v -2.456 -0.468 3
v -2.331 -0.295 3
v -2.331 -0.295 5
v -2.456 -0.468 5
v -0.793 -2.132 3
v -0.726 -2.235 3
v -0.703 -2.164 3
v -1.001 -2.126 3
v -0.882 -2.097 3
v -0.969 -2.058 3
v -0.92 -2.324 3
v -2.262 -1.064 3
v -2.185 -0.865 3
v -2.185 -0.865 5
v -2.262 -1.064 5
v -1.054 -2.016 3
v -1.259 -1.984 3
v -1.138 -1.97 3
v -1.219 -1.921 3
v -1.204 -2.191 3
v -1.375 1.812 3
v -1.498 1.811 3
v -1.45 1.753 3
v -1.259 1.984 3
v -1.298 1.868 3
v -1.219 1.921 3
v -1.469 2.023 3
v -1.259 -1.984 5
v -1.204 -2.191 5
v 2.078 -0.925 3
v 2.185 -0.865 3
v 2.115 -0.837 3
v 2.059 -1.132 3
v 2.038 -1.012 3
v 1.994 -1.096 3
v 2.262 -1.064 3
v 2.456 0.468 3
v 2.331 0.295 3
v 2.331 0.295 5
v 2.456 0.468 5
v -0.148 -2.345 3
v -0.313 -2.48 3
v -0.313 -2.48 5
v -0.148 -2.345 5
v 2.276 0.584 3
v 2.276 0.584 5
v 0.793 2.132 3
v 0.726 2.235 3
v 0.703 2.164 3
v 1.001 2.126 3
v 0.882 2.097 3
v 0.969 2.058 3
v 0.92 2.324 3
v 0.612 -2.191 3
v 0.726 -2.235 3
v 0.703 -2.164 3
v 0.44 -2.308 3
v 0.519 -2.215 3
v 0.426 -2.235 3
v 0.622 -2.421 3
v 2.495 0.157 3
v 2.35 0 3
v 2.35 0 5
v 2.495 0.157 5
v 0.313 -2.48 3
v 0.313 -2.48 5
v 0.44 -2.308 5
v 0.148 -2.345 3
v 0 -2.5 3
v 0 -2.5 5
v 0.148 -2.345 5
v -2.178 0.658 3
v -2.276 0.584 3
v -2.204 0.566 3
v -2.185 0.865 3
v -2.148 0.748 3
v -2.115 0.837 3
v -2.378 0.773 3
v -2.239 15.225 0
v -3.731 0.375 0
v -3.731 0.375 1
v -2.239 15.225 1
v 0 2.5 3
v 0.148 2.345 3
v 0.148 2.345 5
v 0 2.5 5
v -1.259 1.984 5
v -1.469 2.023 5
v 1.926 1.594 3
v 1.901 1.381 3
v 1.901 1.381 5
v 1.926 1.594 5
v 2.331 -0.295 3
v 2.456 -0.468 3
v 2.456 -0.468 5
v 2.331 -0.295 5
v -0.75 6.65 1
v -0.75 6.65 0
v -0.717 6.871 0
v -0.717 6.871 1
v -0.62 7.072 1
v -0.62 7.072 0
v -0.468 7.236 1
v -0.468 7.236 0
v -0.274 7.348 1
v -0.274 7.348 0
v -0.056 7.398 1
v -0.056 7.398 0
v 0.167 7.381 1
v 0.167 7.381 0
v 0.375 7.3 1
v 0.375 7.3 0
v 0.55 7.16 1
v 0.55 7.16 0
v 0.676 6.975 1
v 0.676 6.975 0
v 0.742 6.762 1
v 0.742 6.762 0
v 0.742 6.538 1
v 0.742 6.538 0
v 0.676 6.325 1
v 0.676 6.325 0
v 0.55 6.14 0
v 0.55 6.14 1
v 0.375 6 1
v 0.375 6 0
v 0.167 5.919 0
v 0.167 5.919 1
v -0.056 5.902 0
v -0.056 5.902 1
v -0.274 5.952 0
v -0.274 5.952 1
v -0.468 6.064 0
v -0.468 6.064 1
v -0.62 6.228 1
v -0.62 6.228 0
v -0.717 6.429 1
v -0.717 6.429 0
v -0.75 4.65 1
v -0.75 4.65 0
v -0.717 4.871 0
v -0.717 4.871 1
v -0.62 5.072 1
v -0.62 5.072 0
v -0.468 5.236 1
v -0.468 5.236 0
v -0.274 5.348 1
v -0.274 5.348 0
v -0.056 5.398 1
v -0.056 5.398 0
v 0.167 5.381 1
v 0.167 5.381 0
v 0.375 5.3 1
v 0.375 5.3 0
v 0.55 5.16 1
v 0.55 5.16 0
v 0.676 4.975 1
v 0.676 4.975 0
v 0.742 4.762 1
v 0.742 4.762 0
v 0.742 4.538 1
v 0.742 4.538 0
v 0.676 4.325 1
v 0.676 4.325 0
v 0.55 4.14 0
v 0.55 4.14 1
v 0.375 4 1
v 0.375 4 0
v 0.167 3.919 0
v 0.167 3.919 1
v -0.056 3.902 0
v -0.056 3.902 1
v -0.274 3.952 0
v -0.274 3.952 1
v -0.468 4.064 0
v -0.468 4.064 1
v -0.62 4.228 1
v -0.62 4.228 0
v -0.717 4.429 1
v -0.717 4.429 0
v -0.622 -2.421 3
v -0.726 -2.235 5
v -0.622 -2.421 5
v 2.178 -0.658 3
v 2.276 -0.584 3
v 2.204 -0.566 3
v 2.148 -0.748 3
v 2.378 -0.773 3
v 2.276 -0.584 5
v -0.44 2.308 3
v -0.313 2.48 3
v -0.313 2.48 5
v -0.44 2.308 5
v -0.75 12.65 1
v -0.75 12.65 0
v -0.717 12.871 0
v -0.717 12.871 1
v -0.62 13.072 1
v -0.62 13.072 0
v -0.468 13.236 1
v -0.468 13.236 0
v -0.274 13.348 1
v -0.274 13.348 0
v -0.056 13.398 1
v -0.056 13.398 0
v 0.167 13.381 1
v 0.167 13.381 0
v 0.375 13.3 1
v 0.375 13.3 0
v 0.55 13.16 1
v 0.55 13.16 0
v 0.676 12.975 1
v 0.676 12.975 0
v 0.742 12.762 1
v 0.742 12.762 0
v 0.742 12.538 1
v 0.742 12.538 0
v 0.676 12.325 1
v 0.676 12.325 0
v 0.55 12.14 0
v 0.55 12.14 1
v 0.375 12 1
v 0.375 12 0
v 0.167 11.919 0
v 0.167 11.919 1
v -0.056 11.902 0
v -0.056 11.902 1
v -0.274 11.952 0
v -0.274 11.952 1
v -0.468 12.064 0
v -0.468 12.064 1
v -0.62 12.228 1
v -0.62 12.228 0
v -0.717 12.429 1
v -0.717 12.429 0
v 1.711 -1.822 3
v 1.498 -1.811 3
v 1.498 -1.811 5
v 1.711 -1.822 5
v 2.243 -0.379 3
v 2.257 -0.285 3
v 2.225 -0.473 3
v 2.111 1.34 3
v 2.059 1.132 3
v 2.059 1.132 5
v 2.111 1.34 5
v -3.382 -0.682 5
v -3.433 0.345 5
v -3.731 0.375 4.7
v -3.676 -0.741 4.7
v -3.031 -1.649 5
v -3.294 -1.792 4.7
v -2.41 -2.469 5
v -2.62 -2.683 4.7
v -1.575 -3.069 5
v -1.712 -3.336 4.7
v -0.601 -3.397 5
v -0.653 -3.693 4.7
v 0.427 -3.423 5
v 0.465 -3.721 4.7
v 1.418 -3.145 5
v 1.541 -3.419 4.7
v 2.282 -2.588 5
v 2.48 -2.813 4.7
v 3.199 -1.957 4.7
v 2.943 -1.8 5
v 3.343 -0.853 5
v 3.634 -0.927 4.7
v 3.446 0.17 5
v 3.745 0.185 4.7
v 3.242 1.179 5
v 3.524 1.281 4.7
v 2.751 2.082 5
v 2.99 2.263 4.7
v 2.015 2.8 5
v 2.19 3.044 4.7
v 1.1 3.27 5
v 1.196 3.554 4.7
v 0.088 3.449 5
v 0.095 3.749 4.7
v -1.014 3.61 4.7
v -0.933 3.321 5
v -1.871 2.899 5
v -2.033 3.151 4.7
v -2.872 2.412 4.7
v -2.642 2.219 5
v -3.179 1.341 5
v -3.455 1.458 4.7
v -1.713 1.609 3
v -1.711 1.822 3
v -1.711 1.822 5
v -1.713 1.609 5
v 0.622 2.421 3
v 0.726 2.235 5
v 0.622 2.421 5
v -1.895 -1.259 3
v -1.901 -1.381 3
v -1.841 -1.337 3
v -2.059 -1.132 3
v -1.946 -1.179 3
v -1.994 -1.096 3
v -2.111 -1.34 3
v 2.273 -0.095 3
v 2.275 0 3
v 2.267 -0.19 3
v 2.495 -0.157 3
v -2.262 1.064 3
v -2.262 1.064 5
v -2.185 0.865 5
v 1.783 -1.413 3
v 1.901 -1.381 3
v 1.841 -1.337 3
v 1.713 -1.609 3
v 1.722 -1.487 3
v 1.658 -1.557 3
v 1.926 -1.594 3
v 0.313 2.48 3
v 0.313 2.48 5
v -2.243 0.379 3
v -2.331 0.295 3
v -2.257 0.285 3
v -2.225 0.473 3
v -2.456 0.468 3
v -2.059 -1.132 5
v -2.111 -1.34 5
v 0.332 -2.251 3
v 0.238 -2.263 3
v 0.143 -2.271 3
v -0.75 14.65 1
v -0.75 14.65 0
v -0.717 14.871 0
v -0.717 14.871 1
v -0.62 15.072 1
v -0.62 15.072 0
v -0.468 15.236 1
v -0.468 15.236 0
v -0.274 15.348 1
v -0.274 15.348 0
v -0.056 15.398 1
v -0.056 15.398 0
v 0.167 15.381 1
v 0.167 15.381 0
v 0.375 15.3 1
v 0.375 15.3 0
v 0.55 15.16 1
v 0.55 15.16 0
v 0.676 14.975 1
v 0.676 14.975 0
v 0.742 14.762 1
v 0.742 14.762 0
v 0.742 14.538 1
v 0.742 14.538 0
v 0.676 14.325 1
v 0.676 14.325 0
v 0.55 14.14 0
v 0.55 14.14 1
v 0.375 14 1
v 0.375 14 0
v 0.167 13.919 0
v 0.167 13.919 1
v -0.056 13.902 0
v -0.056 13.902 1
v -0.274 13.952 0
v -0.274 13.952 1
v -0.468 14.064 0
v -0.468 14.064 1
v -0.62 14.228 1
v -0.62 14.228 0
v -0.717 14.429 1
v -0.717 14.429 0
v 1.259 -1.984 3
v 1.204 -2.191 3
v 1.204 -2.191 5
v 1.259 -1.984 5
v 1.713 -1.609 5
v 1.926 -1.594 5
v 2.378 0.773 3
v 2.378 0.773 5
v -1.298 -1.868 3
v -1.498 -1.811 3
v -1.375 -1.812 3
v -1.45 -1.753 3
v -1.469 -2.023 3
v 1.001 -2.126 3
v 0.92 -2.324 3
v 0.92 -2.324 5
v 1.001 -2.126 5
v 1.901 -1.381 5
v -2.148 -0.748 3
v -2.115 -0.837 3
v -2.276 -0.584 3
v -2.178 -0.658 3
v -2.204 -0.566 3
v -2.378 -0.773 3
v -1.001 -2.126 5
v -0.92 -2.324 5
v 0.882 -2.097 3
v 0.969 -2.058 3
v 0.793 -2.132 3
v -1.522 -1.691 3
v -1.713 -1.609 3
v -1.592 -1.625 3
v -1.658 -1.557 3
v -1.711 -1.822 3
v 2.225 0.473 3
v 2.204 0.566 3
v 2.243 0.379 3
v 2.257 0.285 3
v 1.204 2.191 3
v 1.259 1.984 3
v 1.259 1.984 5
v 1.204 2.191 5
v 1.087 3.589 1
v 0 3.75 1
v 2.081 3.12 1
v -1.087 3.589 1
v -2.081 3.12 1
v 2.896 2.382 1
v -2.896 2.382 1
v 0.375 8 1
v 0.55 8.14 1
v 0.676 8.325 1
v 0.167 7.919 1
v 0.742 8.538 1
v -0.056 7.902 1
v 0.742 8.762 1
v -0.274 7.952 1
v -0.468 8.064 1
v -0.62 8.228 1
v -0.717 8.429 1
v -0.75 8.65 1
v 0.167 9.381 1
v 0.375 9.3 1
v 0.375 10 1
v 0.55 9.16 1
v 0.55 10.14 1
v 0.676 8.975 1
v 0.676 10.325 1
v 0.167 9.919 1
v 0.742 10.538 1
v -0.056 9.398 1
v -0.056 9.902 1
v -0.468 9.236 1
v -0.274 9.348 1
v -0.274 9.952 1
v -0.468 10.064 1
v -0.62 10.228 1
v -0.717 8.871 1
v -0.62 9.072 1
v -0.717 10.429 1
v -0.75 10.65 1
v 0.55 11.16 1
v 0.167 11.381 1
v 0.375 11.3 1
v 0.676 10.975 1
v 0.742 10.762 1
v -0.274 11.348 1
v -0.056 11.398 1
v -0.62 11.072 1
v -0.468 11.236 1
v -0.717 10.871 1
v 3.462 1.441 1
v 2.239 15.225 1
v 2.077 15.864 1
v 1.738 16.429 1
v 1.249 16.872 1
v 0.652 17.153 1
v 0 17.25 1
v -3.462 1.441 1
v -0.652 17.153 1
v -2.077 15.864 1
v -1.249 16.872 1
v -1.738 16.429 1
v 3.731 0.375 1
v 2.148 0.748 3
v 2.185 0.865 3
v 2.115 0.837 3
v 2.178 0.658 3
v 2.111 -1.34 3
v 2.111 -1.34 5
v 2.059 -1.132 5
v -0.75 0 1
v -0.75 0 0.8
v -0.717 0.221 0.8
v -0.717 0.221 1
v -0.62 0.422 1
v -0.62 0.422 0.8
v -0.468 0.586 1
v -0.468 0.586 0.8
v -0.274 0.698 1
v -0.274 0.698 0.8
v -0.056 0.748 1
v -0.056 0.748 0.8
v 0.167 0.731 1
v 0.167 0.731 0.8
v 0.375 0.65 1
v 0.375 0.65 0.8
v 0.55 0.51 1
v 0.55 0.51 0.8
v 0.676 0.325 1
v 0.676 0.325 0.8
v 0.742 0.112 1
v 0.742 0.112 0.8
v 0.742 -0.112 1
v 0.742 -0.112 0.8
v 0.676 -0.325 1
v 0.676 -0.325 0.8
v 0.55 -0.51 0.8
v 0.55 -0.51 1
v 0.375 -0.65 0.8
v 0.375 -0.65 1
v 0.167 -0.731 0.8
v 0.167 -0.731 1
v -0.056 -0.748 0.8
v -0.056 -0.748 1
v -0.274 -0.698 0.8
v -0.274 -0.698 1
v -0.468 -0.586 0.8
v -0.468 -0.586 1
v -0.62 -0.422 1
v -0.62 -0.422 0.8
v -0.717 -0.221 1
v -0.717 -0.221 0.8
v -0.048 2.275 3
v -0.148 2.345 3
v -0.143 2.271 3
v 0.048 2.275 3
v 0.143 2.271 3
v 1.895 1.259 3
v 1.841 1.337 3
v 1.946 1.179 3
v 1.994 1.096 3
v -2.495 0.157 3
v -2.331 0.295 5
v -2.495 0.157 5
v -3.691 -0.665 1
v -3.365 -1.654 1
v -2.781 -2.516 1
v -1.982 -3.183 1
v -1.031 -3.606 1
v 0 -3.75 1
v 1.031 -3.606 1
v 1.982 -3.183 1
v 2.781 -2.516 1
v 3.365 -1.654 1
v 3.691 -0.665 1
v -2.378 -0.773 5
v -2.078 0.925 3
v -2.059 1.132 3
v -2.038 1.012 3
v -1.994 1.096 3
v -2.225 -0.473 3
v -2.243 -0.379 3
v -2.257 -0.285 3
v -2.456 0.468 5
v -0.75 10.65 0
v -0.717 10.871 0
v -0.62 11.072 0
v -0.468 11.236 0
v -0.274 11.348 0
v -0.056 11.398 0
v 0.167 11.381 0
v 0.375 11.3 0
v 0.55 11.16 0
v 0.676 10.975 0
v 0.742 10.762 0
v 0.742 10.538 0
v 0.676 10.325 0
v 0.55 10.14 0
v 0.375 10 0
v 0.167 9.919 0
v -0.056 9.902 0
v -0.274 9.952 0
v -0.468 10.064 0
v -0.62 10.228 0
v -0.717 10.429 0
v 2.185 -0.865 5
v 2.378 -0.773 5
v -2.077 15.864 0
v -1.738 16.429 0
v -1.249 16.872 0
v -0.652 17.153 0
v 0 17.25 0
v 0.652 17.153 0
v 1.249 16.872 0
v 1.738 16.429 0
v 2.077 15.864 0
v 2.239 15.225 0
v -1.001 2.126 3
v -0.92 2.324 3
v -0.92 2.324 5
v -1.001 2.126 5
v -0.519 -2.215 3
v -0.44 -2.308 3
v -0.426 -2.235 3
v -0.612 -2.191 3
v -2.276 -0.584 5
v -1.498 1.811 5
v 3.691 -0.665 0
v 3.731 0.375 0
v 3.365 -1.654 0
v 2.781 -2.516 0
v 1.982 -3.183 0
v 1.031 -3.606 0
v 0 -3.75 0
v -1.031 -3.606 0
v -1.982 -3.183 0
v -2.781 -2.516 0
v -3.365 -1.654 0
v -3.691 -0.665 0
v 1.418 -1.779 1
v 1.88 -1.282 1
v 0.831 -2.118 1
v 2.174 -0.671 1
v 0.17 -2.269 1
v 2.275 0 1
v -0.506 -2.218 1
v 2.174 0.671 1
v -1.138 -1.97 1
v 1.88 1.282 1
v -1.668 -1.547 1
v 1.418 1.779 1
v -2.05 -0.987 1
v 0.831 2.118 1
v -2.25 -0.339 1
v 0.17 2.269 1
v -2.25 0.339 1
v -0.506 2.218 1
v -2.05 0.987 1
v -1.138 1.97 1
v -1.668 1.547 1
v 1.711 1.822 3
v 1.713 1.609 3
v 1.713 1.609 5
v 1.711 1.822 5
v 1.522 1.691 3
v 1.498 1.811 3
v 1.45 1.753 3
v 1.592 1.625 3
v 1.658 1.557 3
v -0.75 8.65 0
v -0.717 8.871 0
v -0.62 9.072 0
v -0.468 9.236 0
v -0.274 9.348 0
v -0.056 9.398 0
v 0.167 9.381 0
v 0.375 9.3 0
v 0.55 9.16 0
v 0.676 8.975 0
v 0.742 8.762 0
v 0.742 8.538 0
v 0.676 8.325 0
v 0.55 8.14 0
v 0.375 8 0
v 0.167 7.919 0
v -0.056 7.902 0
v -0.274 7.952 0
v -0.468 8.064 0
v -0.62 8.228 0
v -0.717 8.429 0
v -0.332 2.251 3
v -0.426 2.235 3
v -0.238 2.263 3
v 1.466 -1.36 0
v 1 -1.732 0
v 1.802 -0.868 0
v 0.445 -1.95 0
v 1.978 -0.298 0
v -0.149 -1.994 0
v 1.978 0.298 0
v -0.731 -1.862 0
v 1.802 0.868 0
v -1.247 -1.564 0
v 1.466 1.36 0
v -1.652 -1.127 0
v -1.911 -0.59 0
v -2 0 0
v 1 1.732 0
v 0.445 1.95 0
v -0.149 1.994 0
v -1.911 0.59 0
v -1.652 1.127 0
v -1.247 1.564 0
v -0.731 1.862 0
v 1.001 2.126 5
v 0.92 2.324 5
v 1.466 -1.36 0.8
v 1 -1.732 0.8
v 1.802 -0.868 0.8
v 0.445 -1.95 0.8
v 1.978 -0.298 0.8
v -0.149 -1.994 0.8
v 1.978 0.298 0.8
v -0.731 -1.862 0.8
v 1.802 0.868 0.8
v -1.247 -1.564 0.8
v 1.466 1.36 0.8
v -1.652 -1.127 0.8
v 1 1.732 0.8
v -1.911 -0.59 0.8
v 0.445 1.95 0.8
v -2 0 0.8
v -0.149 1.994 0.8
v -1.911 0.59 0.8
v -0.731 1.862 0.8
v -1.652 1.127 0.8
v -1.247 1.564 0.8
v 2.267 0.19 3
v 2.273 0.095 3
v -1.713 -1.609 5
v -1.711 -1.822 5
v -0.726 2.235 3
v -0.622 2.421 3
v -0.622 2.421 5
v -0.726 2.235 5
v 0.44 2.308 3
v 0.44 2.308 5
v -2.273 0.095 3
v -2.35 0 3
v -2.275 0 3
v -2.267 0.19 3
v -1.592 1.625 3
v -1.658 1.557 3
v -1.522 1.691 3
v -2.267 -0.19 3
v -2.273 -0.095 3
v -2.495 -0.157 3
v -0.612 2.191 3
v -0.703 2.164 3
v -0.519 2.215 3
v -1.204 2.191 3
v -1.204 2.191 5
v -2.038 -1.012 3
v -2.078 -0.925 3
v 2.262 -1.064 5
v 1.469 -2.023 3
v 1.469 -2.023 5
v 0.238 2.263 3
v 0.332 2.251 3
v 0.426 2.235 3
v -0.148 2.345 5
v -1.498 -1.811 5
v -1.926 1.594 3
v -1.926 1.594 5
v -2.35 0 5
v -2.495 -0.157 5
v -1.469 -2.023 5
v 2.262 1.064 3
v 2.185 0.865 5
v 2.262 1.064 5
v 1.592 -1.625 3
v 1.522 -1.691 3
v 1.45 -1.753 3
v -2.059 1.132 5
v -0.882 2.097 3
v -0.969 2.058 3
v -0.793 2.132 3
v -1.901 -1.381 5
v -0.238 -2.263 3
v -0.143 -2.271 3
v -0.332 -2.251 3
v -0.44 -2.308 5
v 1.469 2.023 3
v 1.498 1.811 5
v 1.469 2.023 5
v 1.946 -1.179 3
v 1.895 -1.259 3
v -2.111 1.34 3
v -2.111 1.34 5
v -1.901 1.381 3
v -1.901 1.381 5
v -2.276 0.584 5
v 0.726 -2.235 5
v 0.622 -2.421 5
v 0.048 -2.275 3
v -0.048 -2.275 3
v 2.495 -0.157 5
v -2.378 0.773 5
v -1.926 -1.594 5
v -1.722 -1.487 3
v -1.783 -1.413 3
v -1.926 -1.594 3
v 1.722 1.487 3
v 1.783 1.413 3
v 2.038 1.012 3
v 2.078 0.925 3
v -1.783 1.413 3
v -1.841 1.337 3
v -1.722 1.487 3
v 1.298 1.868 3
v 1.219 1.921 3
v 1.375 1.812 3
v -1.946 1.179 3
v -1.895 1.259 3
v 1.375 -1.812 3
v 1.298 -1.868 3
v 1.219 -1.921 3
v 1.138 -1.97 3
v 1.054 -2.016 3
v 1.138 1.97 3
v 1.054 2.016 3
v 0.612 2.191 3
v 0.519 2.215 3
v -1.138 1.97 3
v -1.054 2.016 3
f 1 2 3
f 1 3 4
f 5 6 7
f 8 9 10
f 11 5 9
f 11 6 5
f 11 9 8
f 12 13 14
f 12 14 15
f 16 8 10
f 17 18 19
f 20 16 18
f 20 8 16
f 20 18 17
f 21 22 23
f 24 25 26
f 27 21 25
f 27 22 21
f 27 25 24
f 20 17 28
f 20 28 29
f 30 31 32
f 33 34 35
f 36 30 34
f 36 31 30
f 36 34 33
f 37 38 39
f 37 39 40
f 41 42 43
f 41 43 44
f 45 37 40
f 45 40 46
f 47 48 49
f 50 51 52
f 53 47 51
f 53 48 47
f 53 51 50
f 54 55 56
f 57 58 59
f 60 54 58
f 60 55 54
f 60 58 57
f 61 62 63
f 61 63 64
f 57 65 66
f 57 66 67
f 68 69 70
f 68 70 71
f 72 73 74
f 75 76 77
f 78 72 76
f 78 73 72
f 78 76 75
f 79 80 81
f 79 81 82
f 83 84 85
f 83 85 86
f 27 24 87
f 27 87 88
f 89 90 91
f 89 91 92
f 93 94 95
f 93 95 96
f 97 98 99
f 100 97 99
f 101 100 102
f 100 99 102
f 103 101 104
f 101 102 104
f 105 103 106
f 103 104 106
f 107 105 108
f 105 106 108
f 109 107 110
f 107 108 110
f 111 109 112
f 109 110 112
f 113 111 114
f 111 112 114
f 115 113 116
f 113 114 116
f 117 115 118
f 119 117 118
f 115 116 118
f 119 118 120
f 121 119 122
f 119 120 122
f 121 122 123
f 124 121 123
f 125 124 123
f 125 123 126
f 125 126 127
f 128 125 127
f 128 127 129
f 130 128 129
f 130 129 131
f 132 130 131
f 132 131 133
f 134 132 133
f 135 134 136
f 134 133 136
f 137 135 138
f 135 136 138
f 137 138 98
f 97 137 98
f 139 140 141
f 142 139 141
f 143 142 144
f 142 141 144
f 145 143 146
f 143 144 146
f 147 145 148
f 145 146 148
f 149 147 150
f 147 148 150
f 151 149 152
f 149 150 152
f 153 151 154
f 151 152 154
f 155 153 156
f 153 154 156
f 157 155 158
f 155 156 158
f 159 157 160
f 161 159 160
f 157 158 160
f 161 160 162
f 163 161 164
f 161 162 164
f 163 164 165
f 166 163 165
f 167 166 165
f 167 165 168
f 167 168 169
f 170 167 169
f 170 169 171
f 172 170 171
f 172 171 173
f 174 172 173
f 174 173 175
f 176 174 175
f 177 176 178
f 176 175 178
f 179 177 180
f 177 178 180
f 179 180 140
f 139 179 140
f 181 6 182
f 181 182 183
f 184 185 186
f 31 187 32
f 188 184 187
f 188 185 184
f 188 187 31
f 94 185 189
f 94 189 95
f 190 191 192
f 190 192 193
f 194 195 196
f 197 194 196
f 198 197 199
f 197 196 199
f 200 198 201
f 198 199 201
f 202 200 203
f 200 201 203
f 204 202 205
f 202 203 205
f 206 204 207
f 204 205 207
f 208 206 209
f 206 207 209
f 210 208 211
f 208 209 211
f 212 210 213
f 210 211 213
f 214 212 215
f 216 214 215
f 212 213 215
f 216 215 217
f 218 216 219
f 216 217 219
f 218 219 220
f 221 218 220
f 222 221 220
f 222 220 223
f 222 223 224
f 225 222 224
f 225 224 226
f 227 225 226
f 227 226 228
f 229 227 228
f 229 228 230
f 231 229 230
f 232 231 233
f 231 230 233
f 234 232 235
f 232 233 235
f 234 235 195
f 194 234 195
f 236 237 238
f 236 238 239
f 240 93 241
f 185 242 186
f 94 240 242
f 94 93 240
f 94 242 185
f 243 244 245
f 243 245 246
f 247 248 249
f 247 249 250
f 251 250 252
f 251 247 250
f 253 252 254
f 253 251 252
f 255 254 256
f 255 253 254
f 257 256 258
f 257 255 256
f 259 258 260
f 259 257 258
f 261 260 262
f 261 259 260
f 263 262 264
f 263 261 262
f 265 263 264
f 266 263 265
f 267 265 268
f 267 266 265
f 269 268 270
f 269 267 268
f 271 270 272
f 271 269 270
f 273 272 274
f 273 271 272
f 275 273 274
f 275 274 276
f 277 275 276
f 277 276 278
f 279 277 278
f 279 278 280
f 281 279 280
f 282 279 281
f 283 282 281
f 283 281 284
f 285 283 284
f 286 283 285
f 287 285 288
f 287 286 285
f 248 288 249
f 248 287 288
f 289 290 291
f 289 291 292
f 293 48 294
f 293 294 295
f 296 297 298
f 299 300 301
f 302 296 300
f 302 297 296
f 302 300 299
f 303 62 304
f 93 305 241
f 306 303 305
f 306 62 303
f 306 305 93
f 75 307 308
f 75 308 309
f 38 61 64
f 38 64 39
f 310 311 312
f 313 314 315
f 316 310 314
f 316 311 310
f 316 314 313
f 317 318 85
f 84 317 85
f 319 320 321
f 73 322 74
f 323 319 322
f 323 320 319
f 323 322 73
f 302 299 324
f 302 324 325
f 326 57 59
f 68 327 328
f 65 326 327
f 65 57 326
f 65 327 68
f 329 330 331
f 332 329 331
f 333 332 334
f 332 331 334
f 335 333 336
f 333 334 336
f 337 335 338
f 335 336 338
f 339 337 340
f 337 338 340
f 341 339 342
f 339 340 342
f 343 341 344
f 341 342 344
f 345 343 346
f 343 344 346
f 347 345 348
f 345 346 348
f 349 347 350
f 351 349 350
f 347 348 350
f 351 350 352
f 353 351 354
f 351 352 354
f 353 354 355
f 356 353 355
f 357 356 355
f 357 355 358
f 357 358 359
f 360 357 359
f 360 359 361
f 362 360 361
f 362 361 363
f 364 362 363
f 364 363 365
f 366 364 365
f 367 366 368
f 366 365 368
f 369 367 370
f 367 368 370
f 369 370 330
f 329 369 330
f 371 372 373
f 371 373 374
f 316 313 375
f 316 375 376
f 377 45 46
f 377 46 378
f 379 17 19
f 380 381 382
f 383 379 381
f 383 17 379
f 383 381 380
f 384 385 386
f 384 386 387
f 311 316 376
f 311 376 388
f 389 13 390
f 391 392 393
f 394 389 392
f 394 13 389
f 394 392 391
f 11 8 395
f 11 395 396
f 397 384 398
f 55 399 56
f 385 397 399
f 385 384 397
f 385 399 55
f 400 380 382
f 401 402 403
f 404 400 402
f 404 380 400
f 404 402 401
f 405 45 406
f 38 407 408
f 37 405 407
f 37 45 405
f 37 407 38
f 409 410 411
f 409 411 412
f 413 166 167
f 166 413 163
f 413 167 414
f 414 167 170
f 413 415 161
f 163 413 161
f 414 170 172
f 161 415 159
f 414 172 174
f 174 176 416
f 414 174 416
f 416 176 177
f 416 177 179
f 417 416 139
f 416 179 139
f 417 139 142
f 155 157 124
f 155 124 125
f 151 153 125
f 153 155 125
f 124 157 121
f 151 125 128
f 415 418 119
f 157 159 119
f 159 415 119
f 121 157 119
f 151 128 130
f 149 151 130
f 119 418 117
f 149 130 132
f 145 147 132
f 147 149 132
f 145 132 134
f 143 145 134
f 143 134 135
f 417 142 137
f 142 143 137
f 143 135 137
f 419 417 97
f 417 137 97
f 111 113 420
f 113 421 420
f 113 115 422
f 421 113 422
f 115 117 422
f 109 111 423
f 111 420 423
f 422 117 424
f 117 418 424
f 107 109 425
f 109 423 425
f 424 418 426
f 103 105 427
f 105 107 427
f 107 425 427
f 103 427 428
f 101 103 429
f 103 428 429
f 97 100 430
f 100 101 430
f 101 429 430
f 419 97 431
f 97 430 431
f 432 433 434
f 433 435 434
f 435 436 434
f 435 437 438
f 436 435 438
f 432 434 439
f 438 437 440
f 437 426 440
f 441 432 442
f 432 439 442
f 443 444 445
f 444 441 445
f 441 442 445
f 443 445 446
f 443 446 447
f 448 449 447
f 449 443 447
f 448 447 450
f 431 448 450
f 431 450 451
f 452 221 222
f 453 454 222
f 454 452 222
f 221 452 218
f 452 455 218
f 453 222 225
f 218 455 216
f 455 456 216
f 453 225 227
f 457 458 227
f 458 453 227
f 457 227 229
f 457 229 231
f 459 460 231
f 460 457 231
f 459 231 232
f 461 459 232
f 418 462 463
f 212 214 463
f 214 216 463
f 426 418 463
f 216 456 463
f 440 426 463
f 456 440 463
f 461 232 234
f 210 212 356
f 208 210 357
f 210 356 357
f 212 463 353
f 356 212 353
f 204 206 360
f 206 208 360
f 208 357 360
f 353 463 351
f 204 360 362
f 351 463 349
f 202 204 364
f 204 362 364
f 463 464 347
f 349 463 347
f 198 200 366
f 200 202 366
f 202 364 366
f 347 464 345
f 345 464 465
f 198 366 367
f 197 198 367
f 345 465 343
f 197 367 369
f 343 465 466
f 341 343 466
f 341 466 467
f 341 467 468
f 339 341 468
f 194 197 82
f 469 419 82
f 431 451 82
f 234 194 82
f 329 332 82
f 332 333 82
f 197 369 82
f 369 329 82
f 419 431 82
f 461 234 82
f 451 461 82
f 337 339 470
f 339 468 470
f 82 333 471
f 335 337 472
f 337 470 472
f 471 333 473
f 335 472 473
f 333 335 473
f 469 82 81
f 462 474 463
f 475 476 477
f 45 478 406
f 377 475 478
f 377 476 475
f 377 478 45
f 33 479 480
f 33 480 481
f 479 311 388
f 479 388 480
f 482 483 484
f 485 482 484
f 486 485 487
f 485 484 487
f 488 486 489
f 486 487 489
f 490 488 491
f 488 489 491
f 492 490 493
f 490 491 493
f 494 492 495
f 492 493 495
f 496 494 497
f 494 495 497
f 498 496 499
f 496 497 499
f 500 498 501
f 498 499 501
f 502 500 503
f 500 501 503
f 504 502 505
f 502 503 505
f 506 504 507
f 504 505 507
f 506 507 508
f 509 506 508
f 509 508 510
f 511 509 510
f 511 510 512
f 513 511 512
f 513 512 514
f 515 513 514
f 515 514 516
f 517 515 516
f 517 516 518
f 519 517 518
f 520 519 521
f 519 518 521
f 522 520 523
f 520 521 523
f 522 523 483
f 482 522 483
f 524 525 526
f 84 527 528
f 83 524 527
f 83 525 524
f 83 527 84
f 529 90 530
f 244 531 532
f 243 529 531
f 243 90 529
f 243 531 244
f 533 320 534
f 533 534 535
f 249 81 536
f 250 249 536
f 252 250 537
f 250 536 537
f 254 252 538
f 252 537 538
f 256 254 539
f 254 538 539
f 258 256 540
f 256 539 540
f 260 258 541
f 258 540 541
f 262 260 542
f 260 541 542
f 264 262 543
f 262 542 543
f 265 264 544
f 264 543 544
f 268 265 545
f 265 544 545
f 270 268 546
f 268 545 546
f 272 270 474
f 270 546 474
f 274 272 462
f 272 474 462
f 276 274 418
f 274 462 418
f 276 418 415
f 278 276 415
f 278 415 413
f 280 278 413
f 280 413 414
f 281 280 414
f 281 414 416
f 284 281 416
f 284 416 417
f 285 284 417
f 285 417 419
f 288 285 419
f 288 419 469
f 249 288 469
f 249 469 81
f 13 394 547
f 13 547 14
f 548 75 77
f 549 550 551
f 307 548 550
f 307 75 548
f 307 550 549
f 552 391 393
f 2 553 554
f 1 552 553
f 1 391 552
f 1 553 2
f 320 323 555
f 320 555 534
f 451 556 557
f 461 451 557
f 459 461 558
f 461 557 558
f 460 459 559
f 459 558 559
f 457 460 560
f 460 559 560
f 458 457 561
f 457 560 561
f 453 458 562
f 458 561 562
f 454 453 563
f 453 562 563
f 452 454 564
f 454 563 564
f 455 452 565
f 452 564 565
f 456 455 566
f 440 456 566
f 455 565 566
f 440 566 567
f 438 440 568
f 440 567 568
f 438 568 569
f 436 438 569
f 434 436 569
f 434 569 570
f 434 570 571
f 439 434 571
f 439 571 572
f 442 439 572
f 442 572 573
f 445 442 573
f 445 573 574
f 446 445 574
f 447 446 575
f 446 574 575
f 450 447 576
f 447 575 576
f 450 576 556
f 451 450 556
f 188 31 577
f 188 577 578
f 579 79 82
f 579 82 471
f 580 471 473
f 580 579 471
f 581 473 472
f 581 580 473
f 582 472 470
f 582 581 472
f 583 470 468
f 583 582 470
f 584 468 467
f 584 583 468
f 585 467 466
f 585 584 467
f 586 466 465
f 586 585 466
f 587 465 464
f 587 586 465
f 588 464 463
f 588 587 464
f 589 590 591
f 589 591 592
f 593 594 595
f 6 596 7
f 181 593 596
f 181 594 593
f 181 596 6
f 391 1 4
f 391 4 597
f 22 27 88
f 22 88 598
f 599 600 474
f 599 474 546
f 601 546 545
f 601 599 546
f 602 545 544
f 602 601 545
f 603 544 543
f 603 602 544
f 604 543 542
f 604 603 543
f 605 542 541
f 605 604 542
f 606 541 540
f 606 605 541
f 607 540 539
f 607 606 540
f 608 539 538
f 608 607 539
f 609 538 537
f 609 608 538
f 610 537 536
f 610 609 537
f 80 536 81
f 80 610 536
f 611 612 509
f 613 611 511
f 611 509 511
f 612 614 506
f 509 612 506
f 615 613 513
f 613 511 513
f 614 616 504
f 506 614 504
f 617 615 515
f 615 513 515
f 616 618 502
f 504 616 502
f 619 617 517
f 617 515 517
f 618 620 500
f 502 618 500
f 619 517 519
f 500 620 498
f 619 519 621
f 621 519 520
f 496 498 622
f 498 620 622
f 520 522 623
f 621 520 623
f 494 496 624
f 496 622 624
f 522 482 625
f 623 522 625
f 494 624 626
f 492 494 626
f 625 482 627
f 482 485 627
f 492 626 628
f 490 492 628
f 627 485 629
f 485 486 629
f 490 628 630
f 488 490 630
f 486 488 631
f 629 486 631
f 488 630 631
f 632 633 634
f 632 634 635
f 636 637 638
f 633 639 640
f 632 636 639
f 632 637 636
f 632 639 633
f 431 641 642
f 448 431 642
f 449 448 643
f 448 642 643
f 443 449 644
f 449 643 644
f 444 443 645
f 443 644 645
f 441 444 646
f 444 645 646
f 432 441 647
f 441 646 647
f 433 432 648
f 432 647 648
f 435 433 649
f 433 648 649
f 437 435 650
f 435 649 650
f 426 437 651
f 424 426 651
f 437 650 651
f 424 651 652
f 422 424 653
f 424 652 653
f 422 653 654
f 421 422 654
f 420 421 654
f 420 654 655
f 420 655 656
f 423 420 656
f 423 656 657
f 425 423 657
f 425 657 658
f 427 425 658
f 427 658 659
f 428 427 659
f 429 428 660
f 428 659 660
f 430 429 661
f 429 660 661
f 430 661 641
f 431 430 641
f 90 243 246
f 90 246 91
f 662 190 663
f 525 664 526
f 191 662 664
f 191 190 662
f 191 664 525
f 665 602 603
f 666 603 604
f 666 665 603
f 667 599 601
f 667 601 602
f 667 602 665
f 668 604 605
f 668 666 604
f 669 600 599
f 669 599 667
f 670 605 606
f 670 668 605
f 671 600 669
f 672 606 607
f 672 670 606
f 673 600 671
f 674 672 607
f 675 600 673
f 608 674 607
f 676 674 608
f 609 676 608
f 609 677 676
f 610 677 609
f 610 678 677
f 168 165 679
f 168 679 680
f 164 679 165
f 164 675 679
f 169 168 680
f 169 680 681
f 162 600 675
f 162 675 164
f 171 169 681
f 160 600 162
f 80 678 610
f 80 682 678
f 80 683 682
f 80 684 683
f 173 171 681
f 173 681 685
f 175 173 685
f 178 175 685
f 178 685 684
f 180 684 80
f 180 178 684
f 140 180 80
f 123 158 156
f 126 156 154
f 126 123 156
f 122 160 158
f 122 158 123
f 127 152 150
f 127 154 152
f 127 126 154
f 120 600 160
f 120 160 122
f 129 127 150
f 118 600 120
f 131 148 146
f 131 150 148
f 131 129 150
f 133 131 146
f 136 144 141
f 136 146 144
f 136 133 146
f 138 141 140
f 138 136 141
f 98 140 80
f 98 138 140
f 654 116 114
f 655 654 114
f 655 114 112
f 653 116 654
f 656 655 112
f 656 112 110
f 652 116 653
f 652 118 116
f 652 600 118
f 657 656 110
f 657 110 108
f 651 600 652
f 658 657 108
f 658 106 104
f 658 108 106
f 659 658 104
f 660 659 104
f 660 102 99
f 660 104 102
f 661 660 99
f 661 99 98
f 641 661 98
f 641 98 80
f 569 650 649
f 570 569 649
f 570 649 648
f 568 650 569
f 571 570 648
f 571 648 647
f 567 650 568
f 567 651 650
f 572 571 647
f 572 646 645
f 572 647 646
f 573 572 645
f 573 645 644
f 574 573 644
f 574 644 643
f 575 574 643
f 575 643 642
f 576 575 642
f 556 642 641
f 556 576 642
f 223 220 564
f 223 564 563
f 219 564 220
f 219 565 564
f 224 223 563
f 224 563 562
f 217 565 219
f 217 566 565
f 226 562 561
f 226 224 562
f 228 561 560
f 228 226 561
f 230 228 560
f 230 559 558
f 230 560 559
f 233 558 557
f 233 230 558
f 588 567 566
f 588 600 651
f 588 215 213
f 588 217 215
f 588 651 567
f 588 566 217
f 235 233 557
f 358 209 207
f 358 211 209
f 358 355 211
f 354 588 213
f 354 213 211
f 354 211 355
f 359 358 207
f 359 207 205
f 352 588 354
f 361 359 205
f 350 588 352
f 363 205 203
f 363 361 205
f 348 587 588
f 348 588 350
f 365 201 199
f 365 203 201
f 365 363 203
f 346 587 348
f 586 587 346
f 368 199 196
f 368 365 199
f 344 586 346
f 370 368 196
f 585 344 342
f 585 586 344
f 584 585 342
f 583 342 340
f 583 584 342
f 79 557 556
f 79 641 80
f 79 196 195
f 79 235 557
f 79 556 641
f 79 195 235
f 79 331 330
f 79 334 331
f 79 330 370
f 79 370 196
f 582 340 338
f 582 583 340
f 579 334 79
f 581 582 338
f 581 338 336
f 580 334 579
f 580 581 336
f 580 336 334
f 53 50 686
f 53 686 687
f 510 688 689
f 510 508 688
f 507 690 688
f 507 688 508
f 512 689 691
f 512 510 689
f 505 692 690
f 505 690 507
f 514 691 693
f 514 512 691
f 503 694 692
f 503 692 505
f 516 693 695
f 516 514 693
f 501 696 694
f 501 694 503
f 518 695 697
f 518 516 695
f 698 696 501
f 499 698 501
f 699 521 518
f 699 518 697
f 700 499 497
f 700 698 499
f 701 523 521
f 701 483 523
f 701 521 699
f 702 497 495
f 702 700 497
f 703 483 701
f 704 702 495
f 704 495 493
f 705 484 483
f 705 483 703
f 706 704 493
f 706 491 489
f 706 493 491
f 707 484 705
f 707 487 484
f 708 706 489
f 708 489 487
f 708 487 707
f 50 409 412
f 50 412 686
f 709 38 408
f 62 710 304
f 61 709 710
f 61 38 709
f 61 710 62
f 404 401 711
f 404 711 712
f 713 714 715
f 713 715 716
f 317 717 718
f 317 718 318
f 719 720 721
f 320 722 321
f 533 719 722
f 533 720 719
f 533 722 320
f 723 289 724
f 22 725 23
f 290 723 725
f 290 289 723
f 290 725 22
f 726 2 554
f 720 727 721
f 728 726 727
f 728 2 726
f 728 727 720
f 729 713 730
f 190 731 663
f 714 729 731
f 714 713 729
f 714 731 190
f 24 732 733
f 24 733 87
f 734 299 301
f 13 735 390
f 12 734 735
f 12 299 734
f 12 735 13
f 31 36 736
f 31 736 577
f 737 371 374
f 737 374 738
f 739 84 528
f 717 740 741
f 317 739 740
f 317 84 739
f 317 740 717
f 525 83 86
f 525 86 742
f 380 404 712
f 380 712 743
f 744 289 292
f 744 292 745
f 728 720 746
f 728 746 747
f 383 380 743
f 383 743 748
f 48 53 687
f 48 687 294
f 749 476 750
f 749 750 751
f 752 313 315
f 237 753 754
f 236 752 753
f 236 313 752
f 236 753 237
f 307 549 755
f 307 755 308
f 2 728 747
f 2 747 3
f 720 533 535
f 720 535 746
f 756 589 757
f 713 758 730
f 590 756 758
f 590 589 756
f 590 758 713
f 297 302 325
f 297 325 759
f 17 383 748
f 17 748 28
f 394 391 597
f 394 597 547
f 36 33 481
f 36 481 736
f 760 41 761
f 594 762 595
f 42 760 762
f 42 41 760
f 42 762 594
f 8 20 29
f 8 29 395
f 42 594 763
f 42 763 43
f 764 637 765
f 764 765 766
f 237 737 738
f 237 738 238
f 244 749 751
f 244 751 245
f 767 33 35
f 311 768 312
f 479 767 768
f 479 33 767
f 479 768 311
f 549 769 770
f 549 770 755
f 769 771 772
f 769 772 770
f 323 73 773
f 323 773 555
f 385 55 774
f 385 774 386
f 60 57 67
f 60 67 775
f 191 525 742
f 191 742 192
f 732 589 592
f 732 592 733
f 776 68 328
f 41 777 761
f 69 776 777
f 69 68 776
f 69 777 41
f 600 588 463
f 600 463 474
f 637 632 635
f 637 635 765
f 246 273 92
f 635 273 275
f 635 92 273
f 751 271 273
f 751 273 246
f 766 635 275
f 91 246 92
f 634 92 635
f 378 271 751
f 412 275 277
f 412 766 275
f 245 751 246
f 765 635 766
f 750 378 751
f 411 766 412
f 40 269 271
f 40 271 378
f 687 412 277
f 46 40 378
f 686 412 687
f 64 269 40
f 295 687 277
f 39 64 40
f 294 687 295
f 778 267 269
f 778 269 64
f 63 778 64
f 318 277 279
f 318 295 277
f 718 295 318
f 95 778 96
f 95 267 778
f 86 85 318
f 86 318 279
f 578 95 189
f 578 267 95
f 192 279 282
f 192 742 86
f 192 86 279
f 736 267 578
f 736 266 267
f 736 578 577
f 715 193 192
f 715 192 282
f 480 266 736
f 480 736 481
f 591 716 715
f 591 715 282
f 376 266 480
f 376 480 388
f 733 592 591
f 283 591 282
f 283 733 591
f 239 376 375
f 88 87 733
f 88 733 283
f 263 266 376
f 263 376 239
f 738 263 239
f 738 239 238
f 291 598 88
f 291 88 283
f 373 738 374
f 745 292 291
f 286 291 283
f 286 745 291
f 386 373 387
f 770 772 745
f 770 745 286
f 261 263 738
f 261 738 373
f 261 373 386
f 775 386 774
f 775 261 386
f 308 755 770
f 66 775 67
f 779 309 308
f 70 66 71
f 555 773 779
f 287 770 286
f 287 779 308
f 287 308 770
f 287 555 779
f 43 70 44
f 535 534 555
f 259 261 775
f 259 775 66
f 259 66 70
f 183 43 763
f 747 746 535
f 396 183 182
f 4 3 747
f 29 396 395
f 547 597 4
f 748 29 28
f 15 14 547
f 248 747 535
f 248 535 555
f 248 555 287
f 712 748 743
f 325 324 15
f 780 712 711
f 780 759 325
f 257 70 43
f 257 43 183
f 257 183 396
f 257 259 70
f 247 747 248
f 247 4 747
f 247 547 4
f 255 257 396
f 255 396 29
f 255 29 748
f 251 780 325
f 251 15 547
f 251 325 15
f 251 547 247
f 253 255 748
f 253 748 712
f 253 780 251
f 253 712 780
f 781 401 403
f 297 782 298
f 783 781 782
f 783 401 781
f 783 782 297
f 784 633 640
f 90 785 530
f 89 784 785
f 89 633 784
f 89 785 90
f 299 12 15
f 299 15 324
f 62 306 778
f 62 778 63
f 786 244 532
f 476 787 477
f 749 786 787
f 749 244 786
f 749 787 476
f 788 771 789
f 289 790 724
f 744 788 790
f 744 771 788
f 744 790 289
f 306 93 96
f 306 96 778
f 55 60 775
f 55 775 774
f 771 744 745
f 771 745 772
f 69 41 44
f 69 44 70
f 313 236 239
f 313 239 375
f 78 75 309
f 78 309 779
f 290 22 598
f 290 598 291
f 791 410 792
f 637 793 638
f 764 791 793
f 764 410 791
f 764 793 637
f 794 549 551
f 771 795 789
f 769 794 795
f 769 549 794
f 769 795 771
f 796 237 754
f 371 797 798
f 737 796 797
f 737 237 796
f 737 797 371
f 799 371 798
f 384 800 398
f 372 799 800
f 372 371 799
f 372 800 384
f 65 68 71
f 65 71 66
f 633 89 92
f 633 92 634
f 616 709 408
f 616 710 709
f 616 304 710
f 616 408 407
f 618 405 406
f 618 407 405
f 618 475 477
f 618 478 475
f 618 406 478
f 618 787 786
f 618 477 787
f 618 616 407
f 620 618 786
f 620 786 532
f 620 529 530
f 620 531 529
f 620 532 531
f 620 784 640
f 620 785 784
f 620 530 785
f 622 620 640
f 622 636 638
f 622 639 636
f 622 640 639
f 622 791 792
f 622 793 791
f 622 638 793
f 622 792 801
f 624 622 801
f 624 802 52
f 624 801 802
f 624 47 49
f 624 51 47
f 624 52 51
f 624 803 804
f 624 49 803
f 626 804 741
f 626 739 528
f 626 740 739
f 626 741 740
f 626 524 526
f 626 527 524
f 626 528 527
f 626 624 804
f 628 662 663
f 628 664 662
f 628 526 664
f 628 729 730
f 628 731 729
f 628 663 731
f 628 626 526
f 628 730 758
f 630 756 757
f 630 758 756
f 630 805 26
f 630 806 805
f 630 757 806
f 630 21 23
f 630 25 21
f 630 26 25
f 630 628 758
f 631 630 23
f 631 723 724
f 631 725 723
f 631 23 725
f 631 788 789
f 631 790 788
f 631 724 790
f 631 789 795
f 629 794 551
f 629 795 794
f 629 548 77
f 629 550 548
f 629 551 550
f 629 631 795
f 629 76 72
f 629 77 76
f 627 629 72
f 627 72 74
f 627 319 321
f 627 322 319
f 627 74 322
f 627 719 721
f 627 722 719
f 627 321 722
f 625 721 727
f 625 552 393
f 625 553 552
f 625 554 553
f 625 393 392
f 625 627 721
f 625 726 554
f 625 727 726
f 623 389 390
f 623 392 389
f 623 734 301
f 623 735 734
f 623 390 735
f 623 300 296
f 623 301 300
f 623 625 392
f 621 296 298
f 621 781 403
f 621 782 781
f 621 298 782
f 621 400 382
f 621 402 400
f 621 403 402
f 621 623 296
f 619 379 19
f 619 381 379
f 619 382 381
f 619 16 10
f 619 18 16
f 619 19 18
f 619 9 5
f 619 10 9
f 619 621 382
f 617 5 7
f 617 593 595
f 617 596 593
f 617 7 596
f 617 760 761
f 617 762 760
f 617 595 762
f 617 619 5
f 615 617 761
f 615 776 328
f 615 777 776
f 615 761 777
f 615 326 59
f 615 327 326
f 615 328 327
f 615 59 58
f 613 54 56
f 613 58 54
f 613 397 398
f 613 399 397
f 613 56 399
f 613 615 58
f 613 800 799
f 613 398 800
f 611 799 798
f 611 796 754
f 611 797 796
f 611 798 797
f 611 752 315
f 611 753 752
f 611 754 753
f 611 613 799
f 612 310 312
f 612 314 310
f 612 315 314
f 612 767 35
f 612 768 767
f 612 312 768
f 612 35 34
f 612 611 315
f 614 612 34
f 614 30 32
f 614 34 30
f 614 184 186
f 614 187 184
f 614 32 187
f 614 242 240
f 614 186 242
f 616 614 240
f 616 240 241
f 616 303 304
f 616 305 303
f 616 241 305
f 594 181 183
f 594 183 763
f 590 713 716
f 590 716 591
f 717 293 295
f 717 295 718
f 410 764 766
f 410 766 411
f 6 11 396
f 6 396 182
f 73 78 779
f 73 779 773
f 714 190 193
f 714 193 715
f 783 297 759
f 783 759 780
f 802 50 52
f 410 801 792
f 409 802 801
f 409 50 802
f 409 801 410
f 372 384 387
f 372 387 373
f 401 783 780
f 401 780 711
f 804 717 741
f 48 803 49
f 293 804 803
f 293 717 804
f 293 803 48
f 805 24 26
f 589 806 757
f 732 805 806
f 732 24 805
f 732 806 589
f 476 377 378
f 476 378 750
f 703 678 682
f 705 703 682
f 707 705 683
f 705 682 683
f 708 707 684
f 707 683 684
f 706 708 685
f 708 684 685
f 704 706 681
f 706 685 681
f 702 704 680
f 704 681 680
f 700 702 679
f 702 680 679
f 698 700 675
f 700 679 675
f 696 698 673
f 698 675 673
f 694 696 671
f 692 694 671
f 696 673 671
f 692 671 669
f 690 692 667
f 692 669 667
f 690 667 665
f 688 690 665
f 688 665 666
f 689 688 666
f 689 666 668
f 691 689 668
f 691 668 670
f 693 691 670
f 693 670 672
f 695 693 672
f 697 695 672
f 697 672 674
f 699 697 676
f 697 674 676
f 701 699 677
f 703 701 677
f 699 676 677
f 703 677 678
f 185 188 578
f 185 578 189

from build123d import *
from build123d.topology import SkipClean

# Parameters (mm, degrees)
BOSS_EXTRUDE1_DEPTH = 1
SKETCH2_R           = 3.75
SKETCH2_R_2         = 2.275
BOSS_EXTRUDE2_DEPTH = 4
SKETCH3_R           = 2
CUT_EXTRUDE1_DEPTH  = 0.8
SKETCH4_R           = 0.75
CUT_EXTRUDE2_DEPTH  = 0.2
SKETCH5_R           = 0.75
CUT_EXTRUDE3_DEPTH  = 1
CHAMFER1_SIZE       = 0.3
CUT_EXTRUDE4_START  = -2
CUT_EXTRUDE4_DEPTH  = 2
CIRPATTERN1_COUNT   = 50


with BuildPart() as part:
    # Sketch1 → Boss-Extrude1 (new body)
    with BuildSketch(Plane.XY):
        with BuildLine():
            Line((-3.731202889, 0.375), (-2.238721733, 15.225))
            ThreePointArc((-2.238721733, 15.225), (0, 17.25), (2.238721733, 15.225))
            Line((2.238721733, 15.225), (3.731202889, 0.375))
            ThreePointArc((3.731202889, 0.375), (0, -3.75), (-3.731202889, 0.375))
        make_face()
    extrude(amount=BOSS_EXTRUDE1_DEPTH)

    # Sketch2 → Boss-Extrude2 (add)
    with SkipClean():  # the faces are left unmerged after this step: merging them gives an invalid solid
        with BuildSketch(Plane.XY.offset(1)):
            with Locations(Location((0, 0, 0), (0, 0, 174.260829523))):
                Circle(SKETCH2_R)
            Circle(SKETCH2_R_2, mode=Mode.SUBTRACT)
        extrude(amount=BOSS_EXTRUDE2_DEPTH)

    # Sketch3 → Cut-Extrude1 (cut)
    with SkipClean():  # the faces are left unmerged after this step: merging them gives an invalid solid
        with BuildSketch(Plane(origin=(0, 0, 0), x_dir=(-1, 0, 0), z_dir=(0, 0, -1))):
            Circle(SKETCH3_R)
        extrude(amount=-CUT_EXTRUDE1_DEPTH, mode=Mode.SUBTRACT)

    # Sketch4 → Cut-Extrude2 (cut)
    with SkipClean():  # the faces are left unmerged after this step: merging them gives an invalid solid
        with BuildSketch(Plane(origin=(0, 0, 0.8), x_dir=(-1, 0, 0), z_dir=(0, 0, -1))):
            Circle(SKETCH4_R)
        extrude(amount=-CUT_EXTRUDE2_DEPTH, mode=Mode.SUBTRACT)

    # Sketch5 → Cut-Extrude3 (cut)
    with SkipClean():  # the faces are left unmerged after this step: merging them gives an invalid solid
        with BuildSketch(Plane(origin=(0, 0, 0), x_dir=(-1, 0, 0), z_dir=(0, 0, -1))):
            with Locations((0, 4.65)):
                Circle(SKETCH5_R)
            with Locations((0, 6.65)):
                Circle(SKETCH5_R)
            with Locations((0, 8.65)):
                Circle(SKETCH5_R)
            with Locations((0, 10.65)):
                Circle(SKETCH5_R)
            with Locations((0, 12.65)):
                Circle(SKETCH5_R)
            with Locations((0, 14.65)):
                Circle(SKETCH5_R)
        extrude(amount=-CUT_EXTRUDE3_DEPTH, mode=Mode.SUBTRACT)

    # Chamfer1
    chamfer1_edges = [part.edges().sort_by_distance(p)[0] for p in [
        (3.731202889, -0.375, 5),
    ]]
    chamfer(chamfer1_edges, length=CHAMFER1_SIZE)

    # Sketch7 → Cut-Extrude4 (cut)
    with SkipClean():  # the faces are left unmerged after this step: merging them gives an invalid solid
        with BuildSketch(Plane.XY.offset(5).offset(CUT_EXTRUDE4_START)):
            with BuildLine():
                Line((0.147557721, 2.345362812), (0, 2.5))
                Line((0, 2.5), (-0.147557721, 2.345362812))
                Line((-0.147557721, 2.345362812), (-0.142848432, 2.270510807))
                ThreePointArc((-0.142848432, 2.270510807), (0, 2.275), (0.142848432, 2.270510807))
                Line((0.142848432, 2.270510807), (0.147557721, 2.345362812))
            make_face()
        cut_extrude4 = extrude(amount=CUT_EXTRUDE4_DEPTH, mode=Mode.SUBTRACT)

    # CirPattern1: Cut-Extrude4 ×50 about axis
    with SkipClean():  # the faces are left unmerged after this step: merging them gives an invalid solid
        cirpattern1_axis = Axis((0, 0, 0), (0, 0, 1))
        for i in range(1, CIRPATTERN1_COUNT):
            add(cut_extrude4.rotate(cirpattern1_axis, i * 360 / CIRPATTERN1_COUNT), mode=Mode.SUBTRACT)


solid = part.part
